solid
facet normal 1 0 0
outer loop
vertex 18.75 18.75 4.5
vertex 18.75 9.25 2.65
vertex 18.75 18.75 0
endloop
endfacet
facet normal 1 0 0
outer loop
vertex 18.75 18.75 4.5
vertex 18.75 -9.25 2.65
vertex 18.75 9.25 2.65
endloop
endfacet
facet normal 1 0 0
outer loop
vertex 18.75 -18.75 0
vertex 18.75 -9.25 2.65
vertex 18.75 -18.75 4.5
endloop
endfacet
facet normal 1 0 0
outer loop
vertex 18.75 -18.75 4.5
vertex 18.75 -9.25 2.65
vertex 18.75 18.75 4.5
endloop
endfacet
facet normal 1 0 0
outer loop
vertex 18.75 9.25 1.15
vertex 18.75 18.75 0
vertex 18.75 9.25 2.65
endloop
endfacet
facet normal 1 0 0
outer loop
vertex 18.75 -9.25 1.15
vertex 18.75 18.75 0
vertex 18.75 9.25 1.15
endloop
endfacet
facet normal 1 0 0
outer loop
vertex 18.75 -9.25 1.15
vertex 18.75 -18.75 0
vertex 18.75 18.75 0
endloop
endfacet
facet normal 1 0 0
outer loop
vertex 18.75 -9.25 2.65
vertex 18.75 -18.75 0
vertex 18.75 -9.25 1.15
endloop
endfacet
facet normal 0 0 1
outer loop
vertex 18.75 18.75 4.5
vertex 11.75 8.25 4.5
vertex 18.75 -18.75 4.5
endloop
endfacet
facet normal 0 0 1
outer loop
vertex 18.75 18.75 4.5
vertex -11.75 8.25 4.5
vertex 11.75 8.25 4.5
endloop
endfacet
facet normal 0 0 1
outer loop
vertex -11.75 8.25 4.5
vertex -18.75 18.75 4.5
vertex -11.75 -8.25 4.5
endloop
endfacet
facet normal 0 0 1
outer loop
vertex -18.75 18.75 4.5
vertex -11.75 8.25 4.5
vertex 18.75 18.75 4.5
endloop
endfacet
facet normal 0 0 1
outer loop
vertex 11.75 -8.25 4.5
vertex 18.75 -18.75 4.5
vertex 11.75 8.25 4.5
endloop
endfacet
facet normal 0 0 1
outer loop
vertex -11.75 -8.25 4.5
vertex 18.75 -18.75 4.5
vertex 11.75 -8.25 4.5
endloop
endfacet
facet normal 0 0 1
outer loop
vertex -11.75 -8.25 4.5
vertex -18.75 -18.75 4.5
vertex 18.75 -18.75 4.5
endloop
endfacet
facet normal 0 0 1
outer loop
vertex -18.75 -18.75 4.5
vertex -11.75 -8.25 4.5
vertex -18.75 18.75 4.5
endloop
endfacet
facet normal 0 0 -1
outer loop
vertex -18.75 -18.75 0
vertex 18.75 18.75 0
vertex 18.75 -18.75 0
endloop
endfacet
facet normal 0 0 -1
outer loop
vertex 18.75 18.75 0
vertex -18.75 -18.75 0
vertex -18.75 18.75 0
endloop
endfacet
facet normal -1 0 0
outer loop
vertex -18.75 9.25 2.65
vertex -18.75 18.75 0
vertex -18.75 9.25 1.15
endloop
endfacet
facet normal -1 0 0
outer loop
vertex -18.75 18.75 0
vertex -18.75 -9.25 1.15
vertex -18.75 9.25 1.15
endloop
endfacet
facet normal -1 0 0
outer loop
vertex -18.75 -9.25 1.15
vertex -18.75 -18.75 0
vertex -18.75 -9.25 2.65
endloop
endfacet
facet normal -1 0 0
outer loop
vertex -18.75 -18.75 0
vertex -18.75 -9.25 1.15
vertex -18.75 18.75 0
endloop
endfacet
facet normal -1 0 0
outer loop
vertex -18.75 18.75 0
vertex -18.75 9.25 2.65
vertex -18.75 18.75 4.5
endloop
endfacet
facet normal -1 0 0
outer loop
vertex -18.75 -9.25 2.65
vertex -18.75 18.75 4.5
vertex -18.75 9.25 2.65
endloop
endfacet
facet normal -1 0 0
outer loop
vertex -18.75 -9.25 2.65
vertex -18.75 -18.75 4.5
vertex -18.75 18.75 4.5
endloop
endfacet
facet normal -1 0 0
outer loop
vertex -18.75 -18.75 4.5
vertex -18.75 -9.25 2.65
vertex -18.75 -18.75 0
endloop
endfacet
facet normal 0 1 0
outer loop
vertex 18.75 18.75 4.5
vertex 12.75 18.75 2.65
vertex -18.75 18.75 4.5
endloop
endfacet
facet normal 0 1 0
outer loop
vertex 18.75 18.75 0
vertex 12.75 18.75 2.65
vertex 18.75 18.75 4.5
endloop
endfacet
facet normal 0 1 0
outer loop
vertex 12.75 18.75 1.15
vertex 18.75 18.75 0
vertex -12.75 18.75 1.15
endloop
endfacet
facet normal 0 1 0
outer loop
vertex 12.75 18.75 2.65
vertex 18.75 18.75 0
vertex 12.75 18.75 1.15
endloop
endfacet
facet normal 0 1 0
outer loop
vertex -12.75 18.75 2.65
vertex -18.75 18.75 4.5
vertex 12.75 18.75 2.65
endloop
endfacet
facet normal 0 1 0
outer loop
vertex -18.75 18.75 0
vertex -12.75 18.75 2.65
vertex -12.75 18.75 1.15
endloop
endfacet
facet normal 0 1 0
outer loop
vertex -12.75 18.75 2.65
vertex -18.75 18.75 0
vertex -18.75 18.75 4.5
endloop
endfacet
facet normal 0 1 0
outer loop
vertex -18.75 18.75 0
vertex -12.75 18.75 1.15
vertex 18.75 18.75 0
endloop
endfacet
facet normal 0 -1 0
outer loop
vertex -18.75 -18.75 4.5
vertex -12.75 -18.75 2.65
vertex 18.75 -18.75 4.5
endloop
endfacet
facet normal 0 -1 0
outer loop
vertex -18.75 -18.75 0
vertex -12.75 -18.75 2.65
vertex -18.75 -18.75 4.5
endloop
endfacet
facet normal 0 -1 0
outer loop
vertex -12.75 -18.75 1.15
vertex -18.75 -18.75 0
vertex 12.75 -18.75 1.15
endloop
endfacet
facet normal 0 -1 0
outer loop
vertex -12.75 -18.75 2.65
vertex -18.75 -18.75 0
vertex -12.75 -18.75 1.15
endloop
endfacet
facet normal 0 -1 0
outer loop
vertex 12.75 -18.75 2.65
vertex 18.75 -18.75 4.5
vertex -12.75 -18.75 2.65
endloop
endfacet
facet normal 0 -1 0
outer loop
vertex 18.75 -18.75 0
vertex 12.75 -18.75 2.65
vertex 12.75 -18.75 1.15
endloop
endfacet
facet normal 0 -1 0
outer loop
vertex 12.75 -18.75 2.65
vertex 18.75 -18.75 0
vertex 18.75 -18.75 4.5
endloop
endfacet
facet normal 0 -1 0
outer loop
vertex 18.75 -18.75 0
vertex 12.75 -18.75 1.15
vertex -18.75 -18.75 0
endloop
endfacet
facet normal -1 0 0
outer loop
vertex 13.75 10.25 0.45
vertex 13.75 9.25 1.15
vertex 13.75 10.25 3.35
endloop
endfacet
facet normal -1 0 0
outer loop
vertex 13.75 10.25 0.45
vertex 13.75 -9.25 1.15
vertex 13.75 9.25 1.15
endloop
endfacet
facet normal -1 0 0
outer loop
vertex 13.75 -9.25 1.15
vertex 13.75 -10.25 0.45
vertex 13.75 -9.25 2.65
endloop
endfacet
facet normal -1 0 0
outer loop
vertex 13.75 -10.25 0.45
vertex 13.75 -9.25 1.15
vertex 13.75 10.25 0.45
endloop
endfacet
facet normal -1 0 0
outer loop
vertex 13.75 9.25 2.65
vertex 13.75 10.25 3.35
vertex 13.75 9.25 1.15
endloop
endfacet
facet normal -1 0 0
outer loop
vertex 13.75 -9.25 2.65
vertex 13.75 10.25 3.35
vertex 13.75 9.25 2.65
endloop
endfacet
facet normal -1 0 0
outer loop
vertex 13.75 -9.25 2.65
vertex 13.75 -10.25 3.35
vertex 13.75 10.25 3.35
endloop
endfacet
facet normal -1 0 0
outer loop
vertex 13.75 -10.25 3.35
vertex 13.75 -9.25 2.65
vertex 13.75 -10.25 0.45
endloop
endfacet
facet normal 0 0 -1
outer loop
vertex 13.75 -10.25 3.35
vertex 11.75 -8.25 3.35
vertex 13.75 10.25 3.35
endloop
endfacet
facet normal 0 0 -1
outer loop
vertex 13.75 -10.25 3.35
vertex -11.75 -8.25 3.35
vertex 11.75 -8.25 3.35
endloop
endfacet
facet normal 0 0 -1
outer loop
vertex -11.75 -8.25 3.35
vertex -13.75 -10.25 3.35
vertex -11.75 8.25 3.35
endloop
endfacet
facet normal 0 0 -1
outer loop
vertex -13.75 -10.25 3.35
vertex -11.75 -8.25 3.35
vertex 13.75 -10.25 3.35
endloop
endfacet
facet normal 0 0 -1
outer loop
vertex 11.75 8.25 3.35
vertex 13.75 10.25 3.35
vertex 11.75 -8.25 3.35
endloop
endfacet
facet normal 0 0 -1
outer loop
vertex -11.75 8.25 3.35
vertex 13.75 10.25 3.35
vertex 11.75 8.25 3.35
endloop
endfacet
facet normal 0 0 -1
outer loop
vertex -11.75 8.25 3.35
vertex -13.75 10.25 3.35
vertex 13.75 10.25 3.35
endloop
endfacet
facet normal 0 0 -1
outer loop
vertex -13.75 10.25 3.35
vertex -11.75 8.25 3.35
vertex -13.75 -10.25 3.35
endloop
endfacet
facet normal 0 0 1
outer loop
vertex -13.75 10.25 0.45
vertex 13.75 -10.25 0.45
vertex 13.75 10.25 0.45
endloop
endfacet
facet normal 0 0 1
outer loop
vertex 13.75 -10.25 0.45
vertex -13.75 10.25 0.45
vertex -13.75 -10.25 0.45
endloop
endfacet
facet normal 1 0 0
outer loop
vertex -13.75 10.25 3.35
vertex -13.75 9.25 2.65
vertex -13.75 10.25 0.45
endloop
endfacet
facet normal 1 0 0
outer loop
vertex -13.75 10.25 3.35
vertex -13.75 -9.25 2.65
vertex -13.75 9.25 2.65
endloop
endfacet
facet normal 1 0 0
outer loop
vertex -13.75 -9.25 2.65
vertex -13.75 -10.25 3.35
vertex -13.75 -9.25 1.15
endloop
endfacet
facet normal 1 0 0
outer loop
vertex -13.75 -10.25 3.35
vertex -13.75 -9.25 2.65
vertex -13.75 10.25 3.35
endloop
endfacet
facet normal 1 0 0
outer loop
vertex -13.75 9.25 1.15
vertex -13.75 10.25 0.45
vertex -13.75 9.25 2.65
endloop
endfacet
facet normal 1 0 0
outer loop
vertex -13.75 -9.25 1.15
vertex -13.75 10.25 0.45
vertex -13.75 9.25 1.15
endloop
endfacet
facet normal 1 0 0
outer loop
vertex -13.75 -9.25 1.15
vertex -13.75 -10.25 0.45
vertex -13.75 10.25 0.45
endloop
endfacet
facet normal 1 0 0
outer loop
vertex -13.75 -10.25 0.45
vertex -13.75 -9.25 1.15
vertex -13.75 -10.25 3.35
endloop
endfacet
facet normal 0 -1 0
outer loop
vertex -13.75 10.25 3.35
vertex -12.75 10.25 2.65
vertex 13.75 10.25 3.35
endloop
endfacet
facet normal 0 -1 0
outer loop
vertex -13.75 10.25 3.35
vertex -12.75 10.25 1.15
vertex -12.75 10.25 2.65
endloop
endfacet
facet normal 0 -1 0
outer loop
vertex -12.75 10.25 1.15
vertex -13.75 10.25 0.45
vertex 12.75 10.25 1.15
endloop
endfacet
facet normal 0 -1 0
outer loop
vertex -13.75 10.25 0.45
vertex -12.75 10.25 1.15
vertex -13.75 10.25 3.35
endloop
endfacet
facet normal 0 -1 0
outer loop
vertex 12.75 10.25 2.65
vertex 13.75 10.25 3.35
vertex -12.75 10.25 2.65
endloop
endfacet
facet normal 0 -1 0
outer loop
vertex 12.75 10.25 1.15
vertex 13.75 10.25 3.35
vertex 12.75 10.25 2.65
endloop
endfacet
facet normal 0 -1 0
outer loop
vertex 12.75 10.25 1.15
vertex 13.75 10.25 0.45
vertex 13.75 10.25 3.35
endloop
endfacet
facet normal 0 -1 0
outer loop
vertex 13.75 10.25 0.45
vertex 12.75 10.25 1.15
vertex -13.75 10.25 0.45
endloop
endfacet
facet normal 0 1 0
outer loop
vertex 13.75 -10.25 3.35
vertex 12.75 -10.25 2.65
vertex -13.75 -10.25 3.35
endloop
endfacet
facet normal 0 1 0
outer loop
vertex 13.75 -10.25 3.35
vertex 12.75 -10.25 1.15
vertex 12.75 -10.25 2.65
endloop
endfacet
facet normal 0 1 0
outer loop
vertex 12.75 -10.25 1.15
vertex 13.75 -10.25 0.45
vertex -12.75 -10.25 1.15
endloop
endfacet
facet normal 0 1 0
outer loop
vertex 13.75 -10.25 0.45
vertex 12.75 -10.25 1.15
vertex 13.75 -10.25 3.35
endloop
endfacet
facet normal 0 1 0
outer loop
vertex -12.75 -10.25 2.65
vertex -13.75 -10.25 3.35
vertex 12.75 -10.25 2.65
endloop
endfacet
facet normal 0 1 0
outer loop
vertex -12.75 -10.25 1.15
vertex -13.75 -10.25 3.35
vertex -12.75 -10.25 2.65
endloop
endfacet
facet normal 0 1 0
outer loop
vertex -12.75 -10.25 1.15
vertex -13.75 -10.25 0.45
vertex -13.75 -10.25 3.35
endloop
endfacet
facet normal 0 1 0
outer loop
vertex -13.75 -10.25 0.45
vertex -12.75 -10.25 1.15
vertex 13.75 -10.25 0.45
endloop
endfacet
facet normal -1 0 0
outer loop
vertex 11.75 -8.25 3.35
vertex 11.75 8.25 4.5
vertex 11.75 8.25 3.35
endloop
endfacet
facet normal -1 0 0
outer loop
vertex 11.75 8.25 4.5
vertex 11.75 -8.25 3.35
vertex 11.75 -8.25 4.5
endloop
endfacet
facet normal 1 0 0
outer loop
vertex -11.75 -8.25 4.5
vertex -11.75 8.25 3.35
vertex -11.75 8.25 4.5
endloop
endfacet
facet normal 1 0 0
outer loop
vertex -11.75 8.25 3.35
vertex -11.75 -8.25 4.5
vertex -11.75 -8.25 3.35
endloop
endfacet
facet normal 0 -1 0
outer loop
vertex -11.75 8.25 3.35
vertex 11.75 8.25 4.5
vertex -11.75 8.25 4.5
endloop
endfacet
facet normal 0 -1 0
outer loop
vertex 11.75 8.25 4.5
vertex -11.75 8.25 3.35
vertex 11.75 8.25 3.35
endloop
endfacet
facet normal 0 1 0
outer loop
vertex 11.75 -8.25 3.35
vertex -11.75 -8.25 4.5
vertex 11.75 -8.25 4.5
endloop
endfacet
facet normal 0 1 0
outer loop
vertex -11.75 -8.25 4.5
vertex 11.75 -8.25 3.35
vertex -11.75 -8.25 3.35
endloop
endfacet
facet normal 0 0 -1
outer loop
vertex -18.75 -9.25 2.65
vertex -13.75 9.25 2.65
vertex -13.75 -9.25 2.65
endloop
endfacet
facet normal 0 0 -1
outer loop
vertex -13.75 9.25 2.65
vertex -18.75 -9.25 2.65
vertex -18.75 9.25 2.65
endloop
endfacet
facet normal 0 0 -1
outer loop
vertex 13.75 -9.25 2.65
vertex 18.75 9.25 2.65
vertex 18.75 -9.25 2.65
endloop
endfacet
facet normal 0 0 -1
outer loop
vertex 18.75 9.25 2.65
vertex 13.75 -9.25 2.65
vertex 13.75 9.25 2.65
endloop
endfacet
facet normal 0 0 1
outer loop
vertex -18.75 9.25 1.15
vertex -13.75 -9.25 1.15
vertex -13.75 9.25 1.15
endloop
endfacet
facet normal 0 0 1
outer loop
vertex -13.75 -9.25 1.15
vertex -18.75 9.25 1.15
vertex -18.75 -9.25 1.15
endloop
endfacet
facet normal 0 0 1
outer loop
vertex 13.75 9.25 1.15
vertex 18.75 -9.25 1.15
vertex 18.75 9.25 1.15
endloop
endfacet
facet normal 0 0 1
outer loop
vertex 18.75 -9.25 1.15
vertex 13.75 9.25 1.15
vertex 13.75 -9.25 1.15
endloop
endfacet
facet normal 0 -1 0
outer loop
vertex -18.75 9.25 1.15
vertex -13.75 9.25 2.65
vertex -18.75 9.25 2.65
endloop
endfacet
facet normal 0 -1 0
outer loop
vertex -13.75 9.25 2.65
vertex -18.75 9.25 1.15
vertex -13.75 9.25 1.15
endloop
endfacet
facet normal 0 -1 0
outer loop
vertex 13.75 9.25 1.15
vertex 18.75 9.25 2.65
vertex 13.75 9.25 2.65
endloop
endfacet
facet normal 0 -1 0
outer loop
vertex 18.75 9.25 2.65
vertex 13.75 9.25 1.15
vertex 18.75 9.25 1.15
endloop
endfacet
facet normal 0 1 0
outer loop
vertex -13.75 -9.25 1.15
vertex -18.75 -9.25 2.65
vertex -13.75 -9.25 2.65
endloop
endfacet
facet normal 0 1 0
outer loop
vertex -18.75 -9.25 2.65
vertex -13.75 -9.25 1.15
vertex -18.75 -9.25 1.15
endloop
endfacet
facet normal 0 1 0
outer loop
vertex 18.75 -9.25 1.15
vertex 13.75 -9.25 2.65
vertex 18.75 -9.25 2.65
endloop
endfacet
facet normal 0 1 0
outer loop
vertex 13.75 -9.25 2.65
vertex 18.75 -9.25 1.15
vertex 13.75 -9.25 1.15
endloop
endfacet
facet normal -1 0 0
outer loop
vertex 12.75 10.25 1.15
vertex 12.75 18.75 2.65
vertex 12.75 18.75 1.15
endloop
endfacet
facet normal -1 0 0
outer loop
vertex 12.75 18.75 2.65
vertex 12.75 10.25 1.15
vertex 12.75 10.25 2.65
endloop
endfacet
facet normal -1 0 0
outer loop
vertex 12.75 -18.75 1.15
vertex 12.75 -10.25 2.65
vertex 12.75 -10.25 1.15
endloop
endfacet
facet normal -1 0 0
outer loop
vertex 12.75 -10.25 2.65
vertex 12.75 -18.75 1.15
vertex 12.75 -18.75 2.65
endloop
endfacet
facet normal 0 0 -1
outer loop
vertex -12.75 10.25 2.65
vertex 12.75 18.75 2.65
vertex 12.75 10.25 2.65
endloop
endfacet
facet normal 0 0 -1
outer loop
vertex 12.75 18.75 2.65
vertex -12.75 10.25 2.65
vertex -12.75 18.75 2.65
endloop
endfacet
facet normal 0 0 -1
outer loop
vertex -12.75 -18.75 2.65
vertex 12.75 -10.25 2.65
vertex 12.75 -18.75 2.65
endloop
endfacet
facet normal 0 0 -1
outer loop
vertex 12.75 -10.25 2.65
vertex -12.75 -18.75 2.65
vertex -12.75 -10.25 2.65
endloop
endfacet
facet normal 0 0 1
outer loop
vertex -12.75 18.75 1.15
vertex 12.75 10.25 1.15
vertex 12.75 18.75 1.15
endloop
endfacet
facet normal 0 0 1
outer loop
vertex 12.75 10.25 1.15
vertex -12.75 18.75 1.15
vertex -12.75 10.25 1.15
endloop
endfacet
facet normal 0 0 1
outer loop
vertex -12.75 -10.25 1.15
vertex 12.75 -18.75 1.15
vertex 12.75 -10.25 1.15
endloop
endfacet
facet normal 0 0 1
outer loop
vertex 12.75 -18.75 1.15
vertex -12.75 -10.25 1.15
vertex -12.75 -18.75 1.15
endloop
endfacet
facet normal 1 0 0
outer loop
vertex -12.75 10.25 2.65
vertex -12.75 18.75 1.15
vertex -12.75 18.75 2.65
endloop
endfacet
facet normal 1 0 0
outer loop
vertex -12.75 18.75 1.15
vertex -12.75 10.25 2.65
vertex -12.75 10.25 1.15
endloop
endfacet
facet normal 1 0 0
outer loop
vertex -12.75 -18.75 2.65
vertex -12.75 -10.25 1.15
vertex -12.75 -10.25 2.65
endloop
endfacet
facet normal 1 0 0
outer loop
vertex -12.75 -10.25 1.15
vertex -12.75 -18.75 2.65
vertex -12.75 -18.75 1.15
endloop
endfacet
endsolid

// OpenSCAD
// ========================================================
// RT ARCHITECTURE - INTEGRATED SOLID-STATE COOLING IHS
// ========================================================

$fn = 60; // Render quality

// --- IHS Dimensions ---
ihs_width = 37.5;       // Standard CPU IHS width (mm)
ihs_length = 37.5;      // Standard CPU IHS length (mm)
ihs_total_height = 4.5; // Total height including internal cavity
die_floor_thick = 0.5;  // Ultra-thin copper floor above silicon die

// --- Solid-State Cavity Dimensions (e.g., AirJet Mini Spec) ---
ss_width = 27.5;        // Width of solid state cooler
ss_length = 20.5;       // Half-length or compact footprint variant
ss_height = 2.8;        // Thickness of the active cooling unit
exhaust_width = 1.5;    // Side exhaust spout slot thickness

module integrated_solid_state_ihs() {
    difference() {
        // 1. Main Outer Metal Cap (Copper Heat Spreader)
        translate([0, 0, ihs_total_height/2])
            cube([ihs_width, ihs_length, ihs_total_height], center=true);
        
        // 2. Embedded Solid-State Fan Internal Cavity
        // Placed directly above the thin die contact floor
        translate([0, 0, die_floor_thick + ss_height/2])
            cube([ss_width, ss_length, ss_height + 0.1], center=true);
        
        // 3. Top Intake Vents (Where the membrane pulls clean air down)
        translate([0, 0, ihs_total_height - 1])
            cube([ss_width - 4, ss_length - 4, 3], center=true);
            
        // 4. Lateral Exhaust Spouts (Flushes hot air out the sides)
        // High-velocity air escapes through these structural paths
        translate([0, 0, die_floor_thick + ss_height/2])
            cube([ihs_width + 2, ss_length - 2, exhaust_width], center=true);
            
        // 5. Secondary Cross-Flow Exhaust Channel
        translate([0, 0, die_floor_thick + ss_height/2])
            cube([ss_width - 2, ihs_length + 2, exhaust_width], center=true);
    }
    
    // Visual Guide: Silicon Die Boundary Footprint Indicator (Underside)
    % translate([0, 0, -0.1])
        color("Gray", 0.5) 
            cube([15, 15, 0.2], center=true);
}

// Instantiate the solid-state structural cap
integrated_solid_state_ihs();
